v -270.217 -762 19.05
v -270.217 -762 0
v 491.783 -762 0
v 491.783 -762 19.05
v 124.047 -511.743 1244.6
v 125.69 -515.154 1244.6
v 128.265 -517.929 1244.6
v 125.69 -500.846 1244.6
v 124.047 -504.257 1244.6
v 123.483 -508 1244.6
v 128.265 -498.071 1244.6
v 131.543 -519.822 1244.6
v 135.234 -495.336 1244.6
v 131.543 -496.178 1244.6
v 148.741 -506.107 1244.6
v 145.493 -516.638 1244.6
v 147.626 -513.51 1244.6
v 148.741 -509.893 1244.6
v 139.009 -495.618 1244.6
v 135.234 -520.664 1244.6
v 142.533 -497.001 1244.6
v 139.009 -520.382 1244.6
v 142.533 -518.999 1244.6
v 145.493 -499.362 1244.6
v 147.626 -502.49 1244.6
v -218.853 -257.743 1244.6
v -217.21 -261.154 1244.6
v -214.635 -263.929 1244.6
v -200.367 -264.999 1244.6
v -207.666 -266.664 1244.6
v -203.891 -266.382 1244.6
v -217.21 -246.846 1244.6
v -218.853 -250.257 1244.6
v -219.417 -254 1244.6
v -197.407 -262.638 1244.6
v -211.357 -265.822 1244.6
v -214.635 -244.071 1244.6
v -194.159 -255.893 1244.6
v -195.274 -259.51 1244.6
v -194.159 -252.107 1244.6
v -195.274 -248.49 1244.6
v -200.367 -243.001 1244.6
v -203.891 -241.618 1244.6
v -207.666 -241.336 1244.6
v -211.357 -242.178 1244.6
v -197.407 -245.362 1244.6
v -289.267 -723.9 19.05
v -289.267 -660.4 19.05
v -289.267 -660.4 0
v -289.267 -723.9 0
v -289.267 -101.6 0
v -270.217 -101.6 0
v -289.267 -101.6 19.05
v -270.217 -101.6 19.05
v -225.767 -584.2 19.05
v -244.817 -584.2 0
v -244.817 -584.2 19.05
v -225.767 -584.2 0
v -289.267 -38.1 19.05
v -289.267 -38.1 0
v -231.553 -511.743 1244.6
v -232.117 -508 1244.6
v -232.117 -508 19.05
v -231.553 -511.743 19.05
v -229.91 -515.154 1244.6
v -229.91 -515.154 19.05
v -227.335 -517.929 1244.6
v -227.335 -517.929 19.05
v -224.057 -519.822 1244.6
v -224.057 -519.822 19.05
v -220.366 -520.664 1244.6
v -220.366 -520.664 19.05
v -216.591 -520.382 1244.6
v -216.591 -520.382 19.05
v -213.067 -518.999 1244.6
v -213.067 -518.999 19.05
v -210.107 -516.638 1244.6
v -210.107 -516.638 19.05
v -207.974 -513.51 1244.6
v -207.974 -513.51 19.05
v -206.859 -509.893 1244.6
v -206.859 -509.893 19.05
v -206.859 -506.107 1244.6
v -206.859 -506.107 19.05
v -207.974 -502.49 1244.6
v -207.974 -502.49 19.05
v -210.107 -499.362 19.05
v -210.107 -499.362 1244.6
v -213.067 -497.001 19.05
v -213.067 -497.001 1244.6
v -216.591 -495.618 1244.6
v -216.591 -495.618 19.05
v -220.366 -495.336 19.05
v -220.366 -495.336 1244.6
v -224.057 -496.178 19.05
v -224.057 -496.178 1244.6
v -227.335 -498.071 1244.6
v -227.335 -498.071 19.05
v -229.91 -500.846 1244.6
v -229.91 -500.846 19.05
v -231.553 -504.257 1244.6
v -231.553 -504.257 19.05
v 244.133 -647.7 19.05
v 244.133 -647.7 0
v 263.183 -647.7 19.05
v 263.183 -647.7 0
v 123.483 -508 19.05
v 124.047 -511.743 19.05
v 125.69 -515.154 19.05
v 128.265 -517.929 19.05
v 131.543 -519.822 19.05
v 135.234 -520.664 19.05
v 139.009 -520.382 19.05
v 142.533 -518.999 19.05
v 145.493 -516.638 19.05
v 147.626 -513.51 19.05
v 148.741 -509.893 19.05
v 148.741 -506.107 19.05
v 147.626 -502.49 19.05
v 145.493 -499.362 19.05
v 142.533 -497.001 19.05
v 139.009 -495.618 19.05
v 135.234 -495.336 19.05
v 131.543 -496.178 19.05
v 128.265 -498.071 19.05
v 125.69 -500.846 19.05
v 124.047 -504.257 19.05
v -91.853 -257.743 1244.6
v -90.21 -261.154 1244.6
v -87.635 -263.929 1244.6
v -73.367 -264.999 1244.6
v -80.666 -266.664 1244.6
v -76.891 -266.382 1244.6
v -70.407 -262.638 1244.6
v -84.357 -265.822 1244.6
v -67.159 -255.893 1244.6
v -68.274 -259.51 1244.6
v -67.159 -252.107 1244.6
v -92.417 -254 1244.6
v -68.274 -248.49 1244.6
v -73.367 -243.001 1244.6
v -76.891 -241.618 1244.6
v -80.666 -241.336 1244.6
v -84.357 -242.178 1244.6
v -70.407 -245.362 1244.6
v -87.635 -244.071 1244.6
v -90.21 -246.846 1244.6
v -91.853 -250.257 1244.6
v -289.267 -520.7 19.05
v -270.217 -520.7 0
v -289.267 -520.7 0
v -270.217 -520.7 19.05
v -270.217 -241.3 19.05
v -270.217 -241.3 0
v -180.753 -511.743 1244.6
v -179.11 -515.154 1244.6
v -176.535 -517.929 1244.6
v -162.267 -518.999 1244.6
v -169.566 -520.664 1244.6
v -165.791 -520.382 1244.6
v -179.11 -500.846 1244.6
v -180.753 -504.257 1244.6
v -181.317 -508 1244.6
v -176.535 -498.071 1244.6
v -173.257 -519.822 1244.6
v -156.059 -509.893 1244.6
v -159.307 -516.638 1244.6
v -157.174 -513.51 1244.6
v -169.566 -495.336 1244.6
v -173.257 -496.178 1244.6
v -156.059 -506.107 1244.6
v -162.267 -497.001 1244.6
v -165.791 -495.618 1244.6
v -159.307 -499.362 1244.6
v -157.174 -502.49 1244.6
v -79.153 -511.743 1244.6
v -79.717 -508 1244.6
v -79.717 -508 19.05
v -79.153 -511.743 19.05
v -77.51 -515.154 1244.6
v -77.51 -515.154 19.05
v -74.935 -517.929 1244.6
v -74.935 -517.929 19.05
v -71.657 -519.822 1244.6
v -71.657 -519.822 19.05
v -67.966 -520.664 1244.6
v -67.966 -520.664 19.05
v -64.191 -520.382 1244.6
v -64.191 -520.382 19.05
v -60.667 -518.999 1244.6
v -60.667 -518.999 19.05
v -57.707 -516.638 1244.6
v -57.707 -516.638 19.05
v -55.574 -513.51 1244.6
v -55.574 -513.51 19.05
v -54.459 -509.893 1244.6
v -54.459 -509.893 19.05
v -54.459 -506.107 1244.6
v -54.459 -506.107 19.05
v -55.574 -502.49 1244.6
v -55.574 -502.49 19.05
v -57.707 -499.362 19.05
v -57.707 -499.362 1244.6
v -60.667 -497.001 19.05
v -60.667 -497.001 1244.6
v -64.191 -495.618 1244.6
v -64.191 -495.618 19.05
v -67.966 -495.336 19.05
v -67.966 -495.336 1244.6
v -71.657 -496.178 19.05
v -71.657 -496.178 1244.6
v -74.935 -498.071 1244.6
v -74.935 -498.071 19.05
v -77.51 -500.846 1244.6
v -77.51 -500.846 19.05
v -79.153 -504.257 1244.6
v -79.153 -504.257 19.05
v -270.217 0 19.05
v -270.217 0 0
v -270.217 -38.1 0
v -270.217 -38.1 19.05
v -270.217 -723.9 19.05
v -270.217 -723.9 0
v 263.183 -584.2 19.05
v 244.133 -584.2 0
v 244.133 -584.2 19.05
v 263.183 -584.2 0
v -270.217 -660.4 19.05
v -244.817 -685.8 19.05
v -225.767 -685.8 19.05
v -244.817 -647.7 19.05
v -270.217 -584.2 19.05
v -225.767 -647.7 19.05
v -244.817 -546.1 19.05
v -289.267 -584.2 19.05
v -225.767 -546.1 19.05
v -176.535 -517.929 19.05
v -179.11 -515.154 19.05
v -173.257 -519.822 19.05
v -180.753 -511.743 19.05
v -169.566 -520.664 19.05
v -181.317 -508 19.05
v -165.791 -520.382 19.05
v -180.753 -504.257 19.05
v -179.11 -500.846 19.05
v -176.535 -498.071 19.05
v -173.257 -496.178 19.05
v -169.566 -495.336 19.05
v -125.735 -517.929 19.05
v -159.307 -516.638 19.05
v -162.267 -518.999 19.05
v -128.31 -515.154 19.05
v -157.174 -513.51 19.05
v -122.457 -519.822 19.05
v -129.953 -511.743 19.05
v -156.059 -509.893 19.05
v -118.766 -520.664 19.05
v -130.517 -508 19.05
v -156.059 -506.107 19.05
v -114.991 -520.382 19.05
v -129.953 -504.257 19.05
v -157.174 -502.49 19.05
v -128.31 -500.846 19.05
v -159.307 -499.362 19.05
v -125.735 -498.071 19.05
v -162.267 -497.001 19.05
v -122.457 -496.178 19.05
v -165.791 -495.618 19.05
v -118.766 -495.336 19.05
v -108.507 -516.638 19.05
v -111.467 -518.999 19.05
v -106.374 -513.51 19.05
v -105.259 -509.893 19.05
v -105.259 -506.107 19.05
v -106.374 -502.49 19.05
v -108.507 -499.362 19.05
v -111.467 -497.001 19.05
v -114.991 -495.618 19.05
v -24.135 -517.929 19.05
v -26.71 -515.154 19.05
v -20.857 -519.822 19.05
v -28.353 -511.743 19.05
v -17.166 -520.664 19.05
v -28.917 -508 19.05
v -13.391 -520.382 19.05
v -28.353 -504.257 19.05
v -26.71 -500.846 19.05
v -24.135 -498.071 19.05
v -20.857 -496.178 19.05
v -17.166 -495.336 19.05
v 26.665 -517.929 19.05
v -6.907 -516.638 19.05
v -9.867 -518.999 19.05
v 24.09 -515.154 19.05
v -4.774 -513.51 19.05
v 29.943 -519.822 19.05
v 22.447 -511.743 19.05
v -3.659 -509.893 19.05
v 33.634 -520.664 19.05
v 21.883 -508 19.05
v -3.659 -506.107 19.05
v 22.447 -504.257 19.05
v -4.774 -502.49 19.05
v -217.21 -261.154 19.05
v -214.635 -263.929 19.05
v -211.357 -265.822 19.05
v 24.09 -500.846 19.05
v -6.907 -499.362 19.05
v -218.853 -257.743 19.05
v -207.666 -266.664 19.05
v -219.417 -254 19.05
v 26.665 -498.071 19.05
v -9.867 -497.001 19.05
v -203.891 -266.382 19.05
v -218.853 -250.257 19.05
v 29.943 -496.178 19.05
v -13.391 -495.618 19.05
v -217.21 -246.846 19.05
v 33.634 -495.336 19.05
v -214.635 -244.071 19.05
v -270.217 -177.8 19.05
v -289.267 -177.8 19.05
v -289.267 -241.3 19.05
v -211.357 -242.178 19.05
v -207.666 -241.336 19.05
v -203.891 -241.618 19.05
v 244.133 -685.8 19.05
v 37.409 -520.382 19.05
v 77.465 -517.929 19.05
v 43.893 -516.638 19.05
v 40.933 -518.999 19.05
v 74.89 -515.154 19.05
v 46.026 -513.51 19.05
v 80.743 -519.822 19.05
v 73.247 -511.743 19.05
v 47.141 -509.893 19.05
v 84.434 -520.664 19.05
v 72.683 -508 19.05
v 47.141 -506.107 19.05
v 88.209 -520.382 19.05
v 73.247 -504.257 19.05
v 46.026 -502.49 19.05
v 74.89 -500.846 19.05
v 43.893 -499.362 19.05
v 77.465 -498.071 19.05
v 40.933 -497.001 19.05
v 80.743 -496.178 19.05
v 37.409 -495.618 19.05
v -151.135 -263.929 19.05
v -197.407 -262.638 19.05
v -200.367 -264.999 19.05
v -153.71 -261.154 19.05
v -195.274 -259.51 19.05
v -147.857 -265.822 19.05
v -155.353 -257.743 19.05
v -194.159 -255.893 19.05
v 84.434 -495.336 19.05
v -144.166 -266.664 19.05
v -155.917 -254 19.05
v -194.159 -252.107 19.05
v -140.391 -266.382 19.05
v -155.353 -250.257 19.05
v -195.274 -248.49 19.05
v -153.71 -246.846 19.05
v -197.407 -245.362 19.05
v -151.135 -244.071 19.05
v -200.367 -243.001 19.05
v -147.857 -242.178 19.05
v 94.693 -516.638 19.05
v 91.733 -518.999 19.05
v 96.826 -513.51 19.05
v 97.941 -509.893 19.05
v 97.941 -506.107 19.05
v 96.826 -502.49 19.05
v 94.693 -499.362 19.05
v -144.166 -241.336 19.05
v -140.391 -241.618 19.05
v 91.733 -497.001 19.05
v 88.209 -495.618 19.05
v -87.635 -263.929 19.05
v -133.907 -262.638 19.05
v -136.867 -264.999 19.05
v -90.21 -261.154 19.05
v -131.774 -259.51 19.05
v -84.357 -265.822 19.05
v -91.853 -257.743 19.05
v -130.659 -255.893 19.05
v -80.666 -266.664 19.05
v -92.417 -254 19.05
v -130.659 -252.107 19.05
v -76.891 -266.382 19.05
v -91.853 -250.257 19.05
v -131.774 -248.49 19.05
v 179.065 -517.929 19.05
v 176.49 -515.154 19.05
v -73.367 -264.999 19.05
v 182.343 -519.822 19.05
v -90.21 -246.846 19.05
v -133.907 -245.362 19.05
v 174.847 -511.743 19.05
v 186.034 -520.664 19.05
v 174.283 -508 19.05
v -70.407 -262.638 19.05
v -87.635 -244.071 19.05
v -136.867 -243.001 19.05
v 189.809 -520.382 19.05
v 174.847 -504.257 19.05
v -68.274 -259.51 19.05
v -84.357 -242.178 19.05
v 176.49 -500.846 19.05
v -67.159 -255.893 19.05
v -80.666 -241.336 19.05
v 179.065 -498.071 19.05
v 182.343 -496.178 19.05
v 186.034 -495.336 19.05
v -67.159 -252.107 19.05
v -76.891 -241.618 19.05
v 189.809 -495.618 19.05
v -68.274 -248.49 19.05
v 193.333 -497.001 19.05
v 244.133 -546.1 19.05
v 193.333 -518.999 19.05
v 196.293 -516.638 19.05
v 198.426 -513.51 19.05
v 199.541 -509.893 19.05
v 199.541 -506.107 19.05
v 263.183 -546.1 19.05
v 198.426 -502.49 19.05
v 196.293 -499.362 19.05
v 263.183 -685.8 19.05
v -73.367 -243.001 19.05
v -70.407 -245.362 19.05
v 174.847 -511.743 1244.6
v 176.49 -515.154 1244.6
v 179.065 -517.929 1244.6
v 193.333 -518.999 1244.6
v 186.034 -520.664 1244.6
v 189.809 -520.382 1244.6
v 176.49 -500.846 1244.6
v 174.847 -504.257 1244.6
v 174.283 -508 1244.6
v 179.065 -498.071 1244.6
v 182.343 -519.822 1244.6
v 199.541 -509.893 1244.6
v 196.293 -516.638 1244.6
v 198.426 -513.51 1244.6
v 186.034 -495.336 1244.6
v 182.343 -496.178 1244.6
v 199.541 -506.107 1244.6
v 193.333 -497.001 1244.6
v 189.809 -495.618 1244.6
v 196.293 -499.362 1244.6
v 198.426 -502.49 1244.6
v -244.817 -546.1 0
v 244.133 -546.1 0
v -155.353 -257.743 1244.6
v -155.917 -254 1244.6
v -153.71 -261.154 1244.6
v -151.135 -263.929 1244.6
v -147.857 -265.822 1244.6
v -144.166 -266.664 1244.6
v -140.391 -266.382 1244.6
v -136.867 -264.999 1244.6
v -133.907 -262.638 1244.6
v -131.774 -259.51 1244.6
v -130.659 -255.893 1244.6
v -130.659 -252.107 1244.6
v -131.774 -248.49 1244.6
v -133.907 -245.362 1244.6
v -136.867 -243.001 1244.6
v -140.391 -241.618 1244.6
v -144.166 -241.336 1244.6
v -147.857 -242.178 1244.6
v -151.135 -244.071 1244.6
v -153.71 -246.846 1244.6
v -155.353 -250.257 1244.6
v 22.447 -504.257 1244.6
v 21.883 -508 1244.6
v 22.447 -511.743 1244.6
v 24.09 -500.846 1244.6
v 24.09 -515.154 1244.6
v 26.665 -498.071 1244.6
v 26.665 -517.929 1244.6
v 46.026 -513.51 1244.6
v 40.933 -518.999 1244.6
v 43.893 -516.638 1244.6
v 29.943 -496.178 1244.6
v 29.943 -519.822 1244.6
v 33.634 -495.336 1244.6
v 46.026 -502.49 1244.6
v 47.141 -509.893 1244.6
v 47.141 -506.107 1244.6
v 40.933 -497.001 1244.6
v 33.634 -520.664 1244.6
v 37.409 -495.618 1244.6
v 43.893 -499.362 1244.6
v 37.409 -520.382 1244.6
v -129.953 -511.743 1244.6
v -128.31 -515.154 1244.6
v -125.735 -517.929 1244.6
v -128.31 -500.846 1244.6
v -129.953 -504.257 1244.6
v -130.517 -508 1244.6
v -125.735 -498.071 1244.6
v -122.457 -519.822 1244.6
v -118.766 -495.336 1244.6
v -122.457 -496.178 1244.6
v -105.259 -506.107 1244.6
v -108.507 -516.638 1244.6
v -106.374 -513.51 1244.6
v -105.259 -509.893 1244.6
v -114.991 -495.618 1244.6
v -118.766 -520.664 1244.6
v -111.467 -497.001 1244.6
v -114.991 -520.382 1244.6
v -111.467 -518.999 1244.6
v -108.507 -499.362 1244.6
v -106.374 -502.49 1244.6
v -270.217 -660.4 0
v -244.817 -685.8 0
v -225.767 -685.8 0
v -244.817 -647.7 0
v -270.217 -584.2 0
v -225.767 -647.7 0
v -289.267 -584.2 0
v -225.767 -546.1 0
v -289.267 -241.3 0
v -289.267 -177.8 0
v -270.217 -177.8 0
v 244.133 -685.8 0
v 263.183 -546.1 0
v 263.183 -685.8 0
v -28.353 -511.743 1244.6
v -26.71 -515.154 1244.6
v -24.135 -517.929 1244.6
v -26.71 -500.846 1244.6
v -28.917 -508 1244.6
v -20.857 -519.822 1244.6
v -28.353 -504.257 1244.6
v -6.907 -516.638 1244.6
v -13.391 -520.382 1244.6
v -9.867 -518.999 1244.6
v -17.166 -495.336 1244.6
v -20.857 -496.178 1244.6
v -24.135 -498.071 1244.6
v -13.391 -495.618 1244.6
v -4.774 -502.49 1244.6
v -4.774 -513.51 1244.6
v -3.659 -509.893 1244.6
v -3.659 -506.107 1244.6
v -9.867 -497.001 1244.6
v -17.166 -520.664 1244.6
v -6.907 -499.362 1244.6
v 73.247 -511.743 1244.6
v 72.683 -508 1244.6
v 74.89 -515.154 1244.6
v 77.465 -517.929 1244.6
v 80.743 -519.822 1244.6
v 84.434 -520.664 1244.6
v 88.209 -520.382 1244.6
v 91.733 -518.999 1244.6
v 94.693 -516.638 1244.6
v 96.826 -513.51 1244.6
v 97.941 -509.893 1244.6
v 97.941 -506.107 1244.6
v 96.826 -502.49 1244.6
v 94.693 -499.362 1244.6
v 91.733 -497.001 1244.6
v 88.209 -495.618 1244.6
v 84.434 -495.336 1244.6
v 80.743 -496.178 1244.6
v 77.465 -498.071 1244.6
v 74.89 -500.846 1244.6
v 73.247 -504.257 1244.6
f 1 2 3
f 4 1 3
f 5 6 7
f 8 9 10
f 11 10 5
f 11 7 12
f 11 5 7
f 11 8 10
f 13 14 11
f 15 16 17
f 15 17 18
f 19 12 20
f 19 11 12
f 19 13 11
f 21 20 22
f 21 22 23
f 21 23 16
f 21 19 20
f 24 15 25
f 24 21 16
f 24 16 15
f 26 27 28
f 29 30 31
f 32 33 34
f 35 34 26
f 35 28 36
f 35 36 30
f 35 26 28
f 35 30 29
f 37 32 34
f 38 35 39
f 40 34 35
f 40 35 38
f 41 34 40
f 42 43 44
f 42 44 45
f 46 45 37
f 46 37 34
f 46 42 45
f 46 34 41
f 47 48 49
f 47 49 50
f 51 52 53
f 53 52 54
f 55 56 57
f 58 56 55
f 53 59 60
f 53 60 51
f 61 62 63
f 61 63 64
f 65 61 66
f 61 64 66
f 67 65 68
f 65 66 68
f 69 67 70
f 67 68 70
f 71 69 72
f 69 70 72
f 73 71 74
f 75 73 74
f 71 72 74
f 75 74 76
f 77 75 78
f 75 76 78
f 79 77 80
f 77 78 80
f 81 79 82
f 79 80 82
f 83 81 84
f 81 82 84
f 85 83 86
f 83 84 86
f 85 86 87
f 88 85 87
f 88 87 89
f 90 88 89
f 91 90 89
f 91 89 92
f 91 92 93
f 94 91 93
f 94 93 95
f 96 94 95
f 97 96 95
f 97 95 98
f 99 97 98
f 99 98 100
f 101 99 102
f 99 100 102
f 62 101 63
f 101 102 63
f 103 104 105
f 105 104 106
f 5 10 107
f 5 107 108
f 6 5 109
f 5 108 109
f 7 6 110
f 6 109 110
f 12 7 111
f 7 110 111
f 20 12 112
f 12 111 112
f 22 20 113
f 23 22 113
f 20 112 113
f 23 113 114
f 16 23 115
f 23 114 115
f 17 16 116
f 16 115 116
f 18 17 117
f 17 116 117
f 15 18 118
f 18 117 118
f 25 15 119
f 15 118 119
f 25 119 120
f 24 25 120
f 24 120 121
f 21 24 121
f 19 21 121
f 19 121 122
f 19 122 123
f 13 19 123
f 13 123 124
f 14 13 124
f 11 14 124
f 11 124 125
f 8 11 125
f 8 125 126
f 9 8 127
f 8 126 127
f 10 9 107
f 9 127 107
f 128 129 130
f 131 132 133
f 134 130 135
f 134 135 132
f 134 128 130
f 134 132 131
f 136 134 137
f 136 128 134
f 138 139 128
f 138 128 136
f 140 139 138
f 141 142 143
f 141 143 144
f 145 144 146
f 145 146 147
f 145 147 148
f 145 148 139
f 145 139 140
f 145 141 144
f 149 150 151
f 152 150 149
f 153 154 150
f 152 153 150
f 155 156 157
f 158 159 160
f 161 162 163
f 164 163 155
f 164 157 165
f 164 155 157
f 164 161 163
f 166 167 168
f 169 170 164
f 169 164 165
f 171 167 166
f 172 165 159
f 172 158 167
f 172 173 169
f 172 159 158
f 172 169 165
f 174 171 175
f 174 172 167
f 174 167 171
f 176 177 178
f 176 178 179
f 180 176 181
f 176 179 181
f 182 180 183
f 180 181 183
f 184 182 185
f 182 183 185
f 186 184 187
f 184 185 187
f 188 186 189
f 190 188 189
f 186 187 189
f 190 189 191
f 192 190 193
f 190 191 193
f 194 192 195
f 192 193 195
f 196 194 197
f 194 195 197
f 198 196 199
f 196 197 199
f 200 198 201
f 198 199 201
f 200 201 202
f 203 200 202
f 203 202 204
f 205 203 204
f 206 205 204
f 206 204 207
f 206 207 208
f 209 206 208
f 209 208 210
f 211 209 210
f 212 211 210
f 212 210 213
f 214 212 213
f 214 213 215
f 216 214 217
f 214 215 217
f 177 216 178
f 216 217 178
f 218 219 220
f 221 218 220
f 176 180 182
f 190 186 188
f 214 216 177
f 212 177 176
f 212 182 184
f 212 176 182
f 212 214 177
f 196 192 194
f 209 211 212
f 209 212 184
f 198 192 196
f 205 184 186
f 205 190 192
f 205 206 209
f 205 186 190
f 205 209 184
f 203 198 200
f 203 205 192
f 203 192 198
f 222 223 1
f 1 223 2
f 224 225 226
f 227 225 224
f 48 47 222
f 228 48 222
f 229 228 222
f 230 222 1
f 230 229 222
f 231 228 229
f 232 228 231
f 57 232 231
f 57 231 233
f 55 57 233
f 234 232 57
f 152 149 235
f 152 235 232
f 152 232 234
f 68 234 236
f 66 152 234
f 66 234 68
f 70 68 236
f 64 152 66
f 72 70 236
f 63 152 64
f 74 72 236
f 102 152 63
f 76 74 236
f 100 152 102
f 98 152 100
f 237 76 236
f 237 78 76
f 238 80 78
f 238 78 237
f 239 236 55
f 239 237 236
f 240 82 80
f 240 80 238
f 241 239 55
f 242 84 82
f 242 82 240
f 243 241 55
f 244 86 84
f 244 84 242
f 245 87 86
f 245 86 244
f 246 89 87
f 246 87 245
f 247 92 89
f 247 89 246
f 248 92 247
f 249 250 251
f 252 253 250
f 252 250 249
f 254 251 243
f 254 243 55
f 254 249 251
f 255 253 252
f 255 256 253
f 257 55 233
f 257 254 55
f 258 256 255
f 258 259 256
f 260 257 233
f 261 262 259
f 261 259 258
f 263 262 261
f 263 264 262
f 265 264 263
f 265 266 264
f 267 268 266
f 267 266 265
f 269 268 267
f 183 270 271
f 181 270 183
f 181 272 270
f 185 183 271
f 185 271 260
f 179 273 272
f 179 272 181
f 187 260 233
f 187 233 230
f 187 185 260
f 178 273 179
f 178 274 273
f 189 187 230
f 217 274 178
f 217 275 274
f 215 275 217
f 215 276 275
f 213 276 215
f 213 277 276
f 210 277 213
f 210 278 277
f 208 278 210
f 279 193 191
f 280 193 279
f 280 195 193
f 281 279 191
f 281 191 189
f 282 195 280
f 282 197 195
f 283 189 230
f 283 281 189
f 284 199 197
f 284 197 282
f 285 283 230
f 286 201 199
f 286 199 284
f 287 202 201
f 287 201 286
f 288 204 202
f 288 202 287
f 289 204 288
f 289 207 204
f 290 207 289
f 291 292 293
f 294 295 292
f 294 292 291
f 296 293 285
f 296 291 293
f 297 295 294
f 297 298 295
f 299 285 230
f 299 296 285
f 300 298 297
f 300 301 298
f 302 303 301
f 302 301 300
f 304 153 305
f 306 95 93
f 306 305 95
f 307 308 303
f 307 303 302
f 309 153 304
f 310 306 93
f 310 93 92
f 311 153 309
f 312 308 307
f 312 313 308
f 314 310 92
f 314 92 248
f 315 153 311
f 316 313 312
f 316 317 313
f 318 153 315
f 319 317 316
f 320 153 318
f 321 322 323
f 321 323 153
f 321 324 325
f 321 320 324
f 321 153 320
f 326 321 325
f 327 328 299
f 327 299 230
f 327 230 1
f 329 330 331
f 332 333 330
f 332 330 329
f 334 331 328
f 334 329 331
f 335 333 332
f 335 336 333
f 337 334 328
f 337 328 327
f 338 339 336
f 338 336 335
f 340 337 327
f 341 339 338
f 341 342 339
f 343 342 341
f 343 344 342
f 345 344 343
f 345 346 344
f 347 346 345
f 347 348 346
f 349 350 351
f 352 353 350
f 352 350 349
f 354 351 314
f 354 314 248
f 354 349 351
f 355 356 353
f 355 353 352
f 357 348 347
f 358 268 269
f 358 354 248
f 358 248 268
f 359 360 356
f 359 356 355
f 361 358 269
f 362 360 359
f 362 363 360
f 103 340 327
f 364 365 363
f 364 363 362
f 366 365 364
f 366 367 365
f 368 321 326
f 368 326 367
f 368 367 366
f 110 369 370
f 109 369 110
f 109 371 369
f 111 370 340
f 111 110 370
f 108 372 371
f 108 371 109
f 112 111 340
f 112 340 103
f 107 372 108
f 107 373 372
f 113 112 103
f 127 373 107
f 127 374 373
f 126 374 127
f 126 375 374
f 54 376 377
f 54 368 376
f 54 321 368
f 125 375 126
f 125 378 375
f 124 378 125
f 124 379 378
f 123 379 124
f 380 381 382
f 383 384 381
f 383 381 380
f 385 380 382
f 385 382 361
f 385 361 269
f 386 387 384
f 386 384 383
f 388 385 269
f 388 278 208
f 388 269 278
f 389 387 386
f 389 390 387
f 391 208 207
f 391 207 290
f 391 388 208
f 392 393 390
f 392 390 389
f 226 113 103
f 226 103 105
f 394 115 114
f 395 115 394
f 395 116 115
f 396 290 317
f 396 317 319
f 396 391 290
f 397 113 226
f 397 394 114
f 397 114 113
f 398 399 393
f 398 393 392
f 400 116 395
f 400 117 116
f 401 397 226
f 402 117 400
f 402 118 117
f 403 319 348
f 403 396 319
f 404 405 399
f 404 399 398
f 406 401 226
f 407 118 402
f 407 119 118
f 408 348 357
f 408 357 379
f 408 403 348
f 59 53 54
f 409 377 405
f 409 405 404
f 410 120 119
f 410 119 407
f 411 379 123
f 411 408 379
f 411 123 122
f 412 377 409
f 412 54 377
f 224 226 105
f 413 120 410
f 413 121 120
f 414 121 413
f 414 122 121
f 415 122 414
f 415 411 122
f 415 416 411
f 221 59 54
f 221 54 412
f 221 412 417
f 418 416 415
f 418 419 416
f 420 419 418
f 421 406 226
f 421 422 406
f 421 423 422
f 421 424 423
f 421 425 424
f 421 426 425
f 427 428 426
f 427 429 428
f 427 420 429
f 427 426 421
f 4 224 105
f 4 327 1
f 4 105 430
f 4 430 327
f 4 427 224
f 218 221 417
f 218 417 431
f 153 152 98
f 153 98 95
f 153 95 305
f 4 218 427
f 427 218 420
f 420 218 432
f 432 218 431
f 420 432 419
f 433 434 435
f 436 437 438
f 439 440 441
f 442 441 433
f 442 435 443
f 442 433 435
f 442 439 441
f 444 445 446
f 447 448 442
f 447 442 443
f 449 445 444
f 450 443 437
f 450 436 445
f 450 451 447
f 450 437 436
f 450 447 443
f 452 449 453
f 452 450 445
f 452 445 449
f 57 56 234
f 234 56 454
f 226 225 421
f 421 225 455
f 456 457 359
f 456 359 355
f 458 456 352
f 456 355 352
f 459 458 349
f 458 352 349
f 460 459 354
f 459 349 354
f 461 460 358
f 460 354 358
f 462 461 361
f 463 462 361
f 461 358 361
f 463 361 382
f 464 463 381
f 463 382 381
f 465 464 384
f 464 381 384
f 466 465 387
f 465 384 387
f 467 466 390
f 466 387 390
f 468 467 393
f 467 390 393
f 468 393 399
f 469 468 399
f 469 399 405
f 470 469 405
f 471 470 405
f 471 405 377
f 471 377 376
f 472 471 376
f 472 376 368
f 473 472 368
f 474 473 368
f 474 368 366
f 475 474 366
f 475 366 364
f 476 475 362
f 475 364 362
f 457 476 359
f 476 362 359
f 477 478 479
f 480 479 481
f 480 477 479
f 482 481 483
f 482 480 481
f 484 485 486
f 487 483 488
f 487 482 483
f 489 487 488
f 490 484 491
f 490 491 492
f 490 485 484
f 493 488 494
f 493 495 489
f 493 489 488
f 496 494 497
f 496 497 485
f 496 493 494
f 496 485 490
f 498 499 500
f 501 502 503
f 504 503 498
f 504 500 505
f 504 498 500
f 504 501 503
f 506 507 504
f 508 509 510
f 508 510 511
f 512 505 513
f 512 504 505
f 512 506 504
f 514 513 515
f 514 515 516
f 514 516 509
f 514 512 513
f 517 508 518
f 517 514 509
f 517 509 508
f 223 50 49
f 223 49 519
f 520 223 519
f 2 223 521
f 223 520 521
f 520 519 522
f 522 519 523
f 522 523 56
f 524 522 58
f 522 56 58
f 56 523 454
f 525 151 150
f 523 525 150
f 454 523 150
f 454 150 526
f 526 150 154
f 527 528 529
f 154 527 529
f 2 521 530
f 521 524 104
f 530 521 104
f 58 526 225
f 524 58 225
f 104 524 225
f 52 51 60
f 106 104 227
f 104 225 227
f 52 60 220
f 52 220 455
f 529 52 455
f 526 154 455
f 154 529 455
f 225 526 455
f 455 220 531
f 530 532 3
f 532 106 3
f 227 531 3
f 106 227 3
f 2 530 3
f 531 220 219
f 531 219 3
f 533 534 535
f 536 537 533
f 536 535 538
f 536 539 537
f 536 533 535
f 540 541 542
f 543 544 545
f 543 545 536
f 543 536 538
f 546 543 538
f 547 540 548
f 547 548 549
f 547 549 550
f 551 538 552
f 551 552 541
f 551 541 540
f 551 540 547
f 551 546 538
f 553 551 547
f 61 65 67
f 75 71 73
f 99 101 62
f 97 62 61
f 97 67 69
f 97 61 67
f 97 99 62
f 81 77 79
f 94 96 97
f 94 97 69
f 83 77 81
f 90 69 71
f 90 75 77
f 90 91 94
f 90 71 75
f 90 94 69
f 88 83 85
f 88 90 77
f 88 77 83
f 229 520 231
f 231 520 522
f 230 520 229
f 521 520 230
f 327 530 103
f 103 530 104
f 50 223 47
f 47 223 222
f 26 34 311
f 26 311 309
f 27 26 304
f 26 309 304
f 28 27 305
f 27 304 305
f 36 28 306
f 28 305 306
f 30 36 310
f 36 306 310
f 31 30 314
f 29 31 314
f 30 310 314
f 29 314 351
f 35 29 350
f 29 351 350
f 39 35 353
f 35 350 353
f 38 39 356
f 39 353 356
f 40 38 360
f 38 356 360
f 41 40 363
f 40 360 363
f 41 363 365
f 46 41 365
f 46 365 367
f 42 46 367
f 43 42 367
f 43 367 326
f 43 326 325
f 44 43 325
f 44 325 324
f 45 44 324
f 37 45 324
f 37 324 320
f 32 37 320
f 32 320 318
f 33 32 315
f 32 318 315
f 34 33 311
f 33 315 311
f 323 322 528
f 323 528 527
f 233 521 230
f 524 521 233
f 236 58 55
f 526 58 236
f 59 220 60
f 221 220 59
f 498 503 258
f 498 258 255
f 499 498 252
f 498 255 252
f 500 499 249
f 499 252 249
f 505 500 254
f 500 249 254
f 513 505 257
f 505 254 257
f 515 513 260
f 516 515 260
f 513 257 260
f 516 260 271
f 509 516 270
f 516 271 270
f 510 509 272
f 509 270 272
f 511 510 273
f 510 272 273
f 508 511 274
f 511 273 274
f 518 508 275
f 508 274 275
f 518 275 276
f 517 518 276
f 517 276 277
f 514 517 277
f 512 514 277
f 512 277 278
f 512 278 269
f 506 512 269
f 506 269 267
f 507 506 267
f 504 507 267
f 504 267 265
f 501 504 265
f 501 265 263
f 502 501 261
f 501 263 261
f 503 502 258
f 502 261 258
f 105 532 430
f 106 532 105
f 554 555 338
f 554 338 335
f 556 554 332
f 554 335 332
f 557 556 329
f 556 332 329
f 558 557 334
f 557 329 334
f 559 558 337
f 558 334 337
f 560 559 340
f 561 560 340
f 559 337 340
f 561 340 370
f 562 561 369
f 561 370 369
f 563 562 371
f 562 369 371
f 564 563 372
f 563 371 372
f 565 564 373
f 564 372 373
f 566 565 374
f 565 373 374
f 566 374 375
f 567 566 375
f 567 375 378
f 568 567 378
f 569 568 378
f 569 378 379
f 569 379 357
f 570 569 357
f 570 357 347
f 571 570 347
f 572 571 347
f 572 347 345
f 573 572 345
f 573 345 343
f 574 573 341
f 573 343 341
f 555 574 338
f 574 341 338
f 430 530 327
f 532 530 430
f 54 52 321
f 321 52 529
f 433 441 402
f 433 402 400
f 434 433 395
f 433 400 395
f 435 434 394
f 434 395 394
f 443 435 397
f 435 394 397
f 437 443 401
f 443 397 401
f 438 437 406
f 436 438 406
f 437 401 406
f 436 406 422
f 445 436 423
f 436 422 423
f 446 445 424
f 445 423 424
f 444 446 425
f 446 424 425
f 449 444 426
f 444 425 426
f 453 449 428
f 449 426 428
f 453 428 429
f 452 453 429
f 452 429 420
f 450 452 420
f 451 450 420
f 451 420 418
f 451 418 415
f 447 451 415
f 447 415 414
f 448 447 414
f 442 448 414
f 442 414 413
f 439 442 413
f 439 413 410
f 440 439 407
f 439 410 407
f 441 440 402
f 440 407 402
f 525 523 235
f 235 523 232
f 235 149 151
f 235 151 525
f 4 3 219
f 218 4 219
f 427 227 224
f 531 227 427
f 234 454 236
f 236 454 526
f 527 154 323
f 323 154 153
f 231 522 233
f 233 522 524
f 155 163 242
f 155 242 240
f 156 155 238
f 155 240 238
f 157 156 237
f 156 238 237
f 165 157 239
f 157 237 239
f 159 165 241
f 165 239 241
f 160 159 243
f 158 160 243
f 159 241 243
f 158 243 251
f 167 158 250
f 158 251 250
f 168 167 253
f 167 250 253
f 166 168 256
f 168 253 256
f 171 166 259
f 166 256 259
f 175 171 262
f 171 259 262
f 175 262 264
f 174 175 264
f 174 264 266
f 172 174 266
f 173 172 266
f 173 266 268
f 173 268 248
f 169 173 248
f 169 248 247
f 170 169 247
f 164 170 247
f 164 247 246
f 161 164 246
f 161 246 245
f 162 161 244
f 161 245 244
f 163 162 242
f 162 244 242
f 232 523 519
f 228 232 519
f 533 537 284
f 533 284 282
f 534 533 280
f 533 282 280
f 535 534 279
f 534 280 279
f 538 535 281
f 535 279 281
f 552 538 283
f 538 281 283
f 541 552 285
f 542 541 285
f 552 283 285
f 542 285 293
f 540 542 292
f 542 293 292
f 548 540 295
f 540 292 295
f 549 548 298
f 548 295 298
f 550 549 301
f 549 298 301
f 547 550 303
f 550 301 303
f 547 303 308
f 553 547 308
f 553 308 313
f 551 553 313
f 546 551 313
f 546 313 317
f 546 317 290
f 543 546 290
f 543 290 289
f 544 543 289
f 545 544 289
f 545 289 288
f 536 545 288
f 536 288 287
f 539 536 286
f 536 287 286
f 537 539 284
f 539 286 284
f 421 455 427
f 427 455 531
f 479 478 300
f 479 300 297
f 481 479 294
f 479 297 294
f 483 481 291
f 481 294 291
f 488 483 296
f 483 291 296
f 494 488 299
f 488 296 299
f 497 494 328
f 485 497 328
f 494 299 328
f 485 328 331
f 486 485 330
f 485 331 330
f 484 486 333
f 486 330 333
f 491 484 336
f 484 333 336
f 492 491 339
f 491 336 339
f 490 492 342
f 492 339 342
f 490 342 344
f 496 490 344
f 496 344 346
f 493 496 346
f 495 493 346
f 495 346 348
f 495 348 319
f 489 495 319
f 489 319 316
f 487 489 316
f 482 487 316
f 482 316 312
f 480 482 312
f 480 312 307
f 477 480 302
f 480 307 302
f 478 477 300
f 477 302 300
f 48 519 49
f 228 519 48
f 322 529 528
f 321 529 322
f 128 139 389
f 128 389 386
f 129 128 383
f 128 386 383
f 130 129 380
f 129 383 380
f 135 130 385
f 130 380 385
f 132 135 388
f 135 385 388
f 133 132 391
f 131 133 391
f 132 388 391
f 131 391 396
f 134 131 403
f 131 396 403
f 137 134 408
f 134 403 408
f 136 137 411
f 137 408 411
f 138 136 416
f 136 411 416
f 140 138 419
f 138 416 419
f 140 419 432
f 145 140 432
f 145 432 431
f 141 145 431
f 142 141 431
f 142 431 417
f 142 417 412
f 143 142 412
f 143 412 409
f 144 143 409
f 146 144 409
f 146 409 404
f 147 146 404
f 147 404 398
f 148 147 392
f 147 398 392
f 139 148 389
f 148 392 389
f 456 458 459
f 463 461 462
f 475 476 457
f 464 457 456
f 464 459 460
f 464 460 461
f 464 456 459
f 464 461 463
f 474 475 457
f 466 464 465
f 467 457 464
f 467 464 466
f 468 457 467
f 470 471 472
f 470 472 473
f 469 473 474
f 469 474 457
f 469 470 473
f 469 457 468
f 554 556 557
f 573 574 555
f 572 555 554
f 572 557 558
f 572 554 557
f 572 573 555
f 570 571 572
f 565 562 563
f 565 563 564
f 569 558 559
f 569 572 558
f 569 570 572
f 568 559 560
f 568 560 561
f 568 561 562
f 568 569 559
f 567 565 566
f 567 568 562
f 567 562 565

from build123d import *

# Parameters (mm, degrees)
F1_DEPTH = 19.05
F3_DEPTH = 1225.55
F4_W     = 19.05
F4_H     = 38.1
F5_DEPTH = 25.4
F6_W     = 63.5
F6_H     = 19.05
F7_DEPTH = 19.05


with BuildPart() as f1:
    # F0 (on Top) → F1 (new body)
    with BuildSketch(Plane.XY):
        Polygon((-16.216737, -254), (-270.216737, 0), (-270.216737, -254), align=None)
        Polygon((-16.216737, -254), (-270.216737, -254), (-270.216737, -508), (237.783263, -508), align=None)
        Polygon((237.783263, -508), (-270.216737, -508), (-270.216737, -762), (491.783263, -762), align=None)
    extrude(amount=F1_DEPTH)

    # F2 (on face) → F3 (join)
    with BuildSketch(Plane.XY.offset(19.05)):
        with BuildLine():
            ThreePointArc((-206.716737, -508), (-219.416737, -495.3), (-232.116737, -508))
            Line((-232.116737, -508), (-206.716737, -508))
        make_face()
        with BuildLine():
            ThreePointArc((199.683263, -508), (186.983263, -495.3), (174.283263, -508))
            Line((174.283263, -508), (199.683263, -508))
        make_face()
        with BuildLine():
            Line((199.683263, -508), (174.283263, -508))
            ThreePointArc((174.283263, -508), (186.983263, -520.7), (199.683263, -508))
        make_face()
        with BuildLine():
            ThreePointArc((148.883263, -508), (136.183263, -495.3), (123.483263, -508))
            Line((123.483263, -508), (148.883263, -508))
        make_face()
        with BuildLine():
            Line((148.883263, -508), (123.483263, -508))
            ThreePointArc((123.483263, -508), (136.183263, -520.7), (148.883263, -508))
        make_face()
        with BuildLine():
            ThreePointArc((98.083263, -508), (85.383263, -495.3), (72.683263, -508))
            Line((72.683263, -508), (98.083263, -508))
        make_face()
        with BuildLine():
            Line((98.083263, -508), (72.683263, -508))
            ThreePointArc((72.683263, -508), (85.383263, -520.7), (98.083263, -508))
        make_face()
        with BuildLine():
            ThreePointArc((47.283263, -508), (34.583263, -495.3), (21.883263, -508))
            Line((21.883263, -508), (47.283263, -508))
        make_face()
        with BuildLine():
            Line((47.283263, -508), (21.883263, -508))
            ThreePointArc((21.883263, -508), (34.583263, -520.7), (47.283263, -508))
        make_face()
        with BuildLine():
            ThreePointArc((-3.516737, -508), (-16.216737, -495.3), (-28.916737, -508))
            Line((-28.916737, -508), (-3.516737, -508))
        make_face()
        with BuildLine():
            Line((-3.516737, -508), (-28.916737, -508))
            ThreePointArc((-28.916737, -508), (-16.216737, -520.7), (-3.516737, -508))
        make_face()
        with BuildLine():
            ThreePointArc((-54.316737, -508), (-67.016737, -495.3), (-79.716737, -508))
            Line((-79.716737, -508), (-54.316737, -508))
        make_face()
        with BuildLine():
            Line((-54.316737, -508), (-79.716737, -508))
            ThreePointArc((-79.716737, -508), (-67.016737, -520.7), (-54.316737, -508))
        make_face()
        with BuildLine():
            ThreePointArc((-105.116737, -508), (-117.816737, -495.3), (-130.516737, -508))
            Line((-130.516737, -508), (-105.116737, -508))
        make_face()
        with BuildLine():
            Line((-105.116737, -508), (-130.516737, -508))
            ThreePointArc((-130.516737, -508), (-117.816737, -520.7), (-105.116737, -508))
        make_face()
        with BuildLine():
            ThreePointArc((-155.916737, -508), (-168.616737, -495.3), (-181.316737, -508))
            Line((-181.316737, -508), (-155.916737, -508))
        make_face()
        with BuildLine():
            Line((-155.916737, -508), (-181.316737, -508))
            ThreePointArc((-181.316737, -508), (-168.616737, -520.7), (-155.916737, -508))
        make_face()
        with BuildLine():
            Line((-206.716737, -508), (-232.116737, -508))
            ThreePointArc((-232.116737, -508), (-219.416737, -520.7), (-206.716737, -508))
        make_face()
        with BuildLine():
            ThreePointArc((-194.016737, -254), (-206.716737, -241.3), (-219.416737, -254))
            Line((-219.416737, -254), (-194.016737, -254))
        make_face()
        with BuildLine():
            ThreePointArc((-67.016737, -254), (-79.716737, -241.3), (-92.416737, -254))
            Line((-92.416737, -254), (-67.016737, -254))
        make_face()
        with BuildLine():
            Line((-67.016737, -254), (-92.416737, -254))
            ThreePointArc((-92.416737, -254), (-79.716737, -266.7), (-67.016737, -254))
        make_face()
        with BuildLine():
            ThreePointArc((-130.516737, -254), (-143.216737, -241.3), (-155.916737, -254))
            Line((-155.916737, -254), (-130.516737, -254))
        make_face()
        with BuildLine():
            Line((-130.516737, -254), (-155.916737, -254))
            ThreePointArc((-155.916737, -254), (-143.216737, -266.7), (-130.516737, -254))
        make_face()
        with BuildLine():
            Line((-194.016737, -254), (-219.416737, -254))
            ThreePointArc((-219.416737, -254), (-206.716737, -266.7), (-194.016737, -254))
        make_face()
    extrude(amount=F3_DEPTH)

    # F4 (on face) → F5 (cut)
    with BuildSketch(Plane.XY):
        with Locations((-235.291737, -565.15)):
            Rectangle(F4_W, F4_H)
        with Locations((-235.291737, -666.75)):
            Rectangle(F4_W, F4_H)
        with Locations((253.658263, -565.15)):
            Rectangle(F4_W, F4_H)
        with Locations((253.658263, -666.75)):
            Rectangle(F4_W, F4_H)
    extrude(amount=F5_DEPTH, mode=Mode.SUBTRACT)

    # F6 (on face) → F7 (join)
    with BuildSketch(Plane(origin=(-270.216737, 0, 0), x_dir=(0, -1, 0), z_dir=(-1, 0, 0))):
        with Locations((552.45, 9.525)):
            Rectangle(F6_W, F6_H)
        with Locations((692.15, 9.525)):
            Rectangle(F6_W, F6_H)
        with Locations((69.85, 9.525)):
            Rectangle(F6_W, F6_H)
        with Locations((209.55, 9.525)):
            Rectangle(F6_W, F6_H)
    extrude(amount=F7_DEPTH)


solid = f1.part
